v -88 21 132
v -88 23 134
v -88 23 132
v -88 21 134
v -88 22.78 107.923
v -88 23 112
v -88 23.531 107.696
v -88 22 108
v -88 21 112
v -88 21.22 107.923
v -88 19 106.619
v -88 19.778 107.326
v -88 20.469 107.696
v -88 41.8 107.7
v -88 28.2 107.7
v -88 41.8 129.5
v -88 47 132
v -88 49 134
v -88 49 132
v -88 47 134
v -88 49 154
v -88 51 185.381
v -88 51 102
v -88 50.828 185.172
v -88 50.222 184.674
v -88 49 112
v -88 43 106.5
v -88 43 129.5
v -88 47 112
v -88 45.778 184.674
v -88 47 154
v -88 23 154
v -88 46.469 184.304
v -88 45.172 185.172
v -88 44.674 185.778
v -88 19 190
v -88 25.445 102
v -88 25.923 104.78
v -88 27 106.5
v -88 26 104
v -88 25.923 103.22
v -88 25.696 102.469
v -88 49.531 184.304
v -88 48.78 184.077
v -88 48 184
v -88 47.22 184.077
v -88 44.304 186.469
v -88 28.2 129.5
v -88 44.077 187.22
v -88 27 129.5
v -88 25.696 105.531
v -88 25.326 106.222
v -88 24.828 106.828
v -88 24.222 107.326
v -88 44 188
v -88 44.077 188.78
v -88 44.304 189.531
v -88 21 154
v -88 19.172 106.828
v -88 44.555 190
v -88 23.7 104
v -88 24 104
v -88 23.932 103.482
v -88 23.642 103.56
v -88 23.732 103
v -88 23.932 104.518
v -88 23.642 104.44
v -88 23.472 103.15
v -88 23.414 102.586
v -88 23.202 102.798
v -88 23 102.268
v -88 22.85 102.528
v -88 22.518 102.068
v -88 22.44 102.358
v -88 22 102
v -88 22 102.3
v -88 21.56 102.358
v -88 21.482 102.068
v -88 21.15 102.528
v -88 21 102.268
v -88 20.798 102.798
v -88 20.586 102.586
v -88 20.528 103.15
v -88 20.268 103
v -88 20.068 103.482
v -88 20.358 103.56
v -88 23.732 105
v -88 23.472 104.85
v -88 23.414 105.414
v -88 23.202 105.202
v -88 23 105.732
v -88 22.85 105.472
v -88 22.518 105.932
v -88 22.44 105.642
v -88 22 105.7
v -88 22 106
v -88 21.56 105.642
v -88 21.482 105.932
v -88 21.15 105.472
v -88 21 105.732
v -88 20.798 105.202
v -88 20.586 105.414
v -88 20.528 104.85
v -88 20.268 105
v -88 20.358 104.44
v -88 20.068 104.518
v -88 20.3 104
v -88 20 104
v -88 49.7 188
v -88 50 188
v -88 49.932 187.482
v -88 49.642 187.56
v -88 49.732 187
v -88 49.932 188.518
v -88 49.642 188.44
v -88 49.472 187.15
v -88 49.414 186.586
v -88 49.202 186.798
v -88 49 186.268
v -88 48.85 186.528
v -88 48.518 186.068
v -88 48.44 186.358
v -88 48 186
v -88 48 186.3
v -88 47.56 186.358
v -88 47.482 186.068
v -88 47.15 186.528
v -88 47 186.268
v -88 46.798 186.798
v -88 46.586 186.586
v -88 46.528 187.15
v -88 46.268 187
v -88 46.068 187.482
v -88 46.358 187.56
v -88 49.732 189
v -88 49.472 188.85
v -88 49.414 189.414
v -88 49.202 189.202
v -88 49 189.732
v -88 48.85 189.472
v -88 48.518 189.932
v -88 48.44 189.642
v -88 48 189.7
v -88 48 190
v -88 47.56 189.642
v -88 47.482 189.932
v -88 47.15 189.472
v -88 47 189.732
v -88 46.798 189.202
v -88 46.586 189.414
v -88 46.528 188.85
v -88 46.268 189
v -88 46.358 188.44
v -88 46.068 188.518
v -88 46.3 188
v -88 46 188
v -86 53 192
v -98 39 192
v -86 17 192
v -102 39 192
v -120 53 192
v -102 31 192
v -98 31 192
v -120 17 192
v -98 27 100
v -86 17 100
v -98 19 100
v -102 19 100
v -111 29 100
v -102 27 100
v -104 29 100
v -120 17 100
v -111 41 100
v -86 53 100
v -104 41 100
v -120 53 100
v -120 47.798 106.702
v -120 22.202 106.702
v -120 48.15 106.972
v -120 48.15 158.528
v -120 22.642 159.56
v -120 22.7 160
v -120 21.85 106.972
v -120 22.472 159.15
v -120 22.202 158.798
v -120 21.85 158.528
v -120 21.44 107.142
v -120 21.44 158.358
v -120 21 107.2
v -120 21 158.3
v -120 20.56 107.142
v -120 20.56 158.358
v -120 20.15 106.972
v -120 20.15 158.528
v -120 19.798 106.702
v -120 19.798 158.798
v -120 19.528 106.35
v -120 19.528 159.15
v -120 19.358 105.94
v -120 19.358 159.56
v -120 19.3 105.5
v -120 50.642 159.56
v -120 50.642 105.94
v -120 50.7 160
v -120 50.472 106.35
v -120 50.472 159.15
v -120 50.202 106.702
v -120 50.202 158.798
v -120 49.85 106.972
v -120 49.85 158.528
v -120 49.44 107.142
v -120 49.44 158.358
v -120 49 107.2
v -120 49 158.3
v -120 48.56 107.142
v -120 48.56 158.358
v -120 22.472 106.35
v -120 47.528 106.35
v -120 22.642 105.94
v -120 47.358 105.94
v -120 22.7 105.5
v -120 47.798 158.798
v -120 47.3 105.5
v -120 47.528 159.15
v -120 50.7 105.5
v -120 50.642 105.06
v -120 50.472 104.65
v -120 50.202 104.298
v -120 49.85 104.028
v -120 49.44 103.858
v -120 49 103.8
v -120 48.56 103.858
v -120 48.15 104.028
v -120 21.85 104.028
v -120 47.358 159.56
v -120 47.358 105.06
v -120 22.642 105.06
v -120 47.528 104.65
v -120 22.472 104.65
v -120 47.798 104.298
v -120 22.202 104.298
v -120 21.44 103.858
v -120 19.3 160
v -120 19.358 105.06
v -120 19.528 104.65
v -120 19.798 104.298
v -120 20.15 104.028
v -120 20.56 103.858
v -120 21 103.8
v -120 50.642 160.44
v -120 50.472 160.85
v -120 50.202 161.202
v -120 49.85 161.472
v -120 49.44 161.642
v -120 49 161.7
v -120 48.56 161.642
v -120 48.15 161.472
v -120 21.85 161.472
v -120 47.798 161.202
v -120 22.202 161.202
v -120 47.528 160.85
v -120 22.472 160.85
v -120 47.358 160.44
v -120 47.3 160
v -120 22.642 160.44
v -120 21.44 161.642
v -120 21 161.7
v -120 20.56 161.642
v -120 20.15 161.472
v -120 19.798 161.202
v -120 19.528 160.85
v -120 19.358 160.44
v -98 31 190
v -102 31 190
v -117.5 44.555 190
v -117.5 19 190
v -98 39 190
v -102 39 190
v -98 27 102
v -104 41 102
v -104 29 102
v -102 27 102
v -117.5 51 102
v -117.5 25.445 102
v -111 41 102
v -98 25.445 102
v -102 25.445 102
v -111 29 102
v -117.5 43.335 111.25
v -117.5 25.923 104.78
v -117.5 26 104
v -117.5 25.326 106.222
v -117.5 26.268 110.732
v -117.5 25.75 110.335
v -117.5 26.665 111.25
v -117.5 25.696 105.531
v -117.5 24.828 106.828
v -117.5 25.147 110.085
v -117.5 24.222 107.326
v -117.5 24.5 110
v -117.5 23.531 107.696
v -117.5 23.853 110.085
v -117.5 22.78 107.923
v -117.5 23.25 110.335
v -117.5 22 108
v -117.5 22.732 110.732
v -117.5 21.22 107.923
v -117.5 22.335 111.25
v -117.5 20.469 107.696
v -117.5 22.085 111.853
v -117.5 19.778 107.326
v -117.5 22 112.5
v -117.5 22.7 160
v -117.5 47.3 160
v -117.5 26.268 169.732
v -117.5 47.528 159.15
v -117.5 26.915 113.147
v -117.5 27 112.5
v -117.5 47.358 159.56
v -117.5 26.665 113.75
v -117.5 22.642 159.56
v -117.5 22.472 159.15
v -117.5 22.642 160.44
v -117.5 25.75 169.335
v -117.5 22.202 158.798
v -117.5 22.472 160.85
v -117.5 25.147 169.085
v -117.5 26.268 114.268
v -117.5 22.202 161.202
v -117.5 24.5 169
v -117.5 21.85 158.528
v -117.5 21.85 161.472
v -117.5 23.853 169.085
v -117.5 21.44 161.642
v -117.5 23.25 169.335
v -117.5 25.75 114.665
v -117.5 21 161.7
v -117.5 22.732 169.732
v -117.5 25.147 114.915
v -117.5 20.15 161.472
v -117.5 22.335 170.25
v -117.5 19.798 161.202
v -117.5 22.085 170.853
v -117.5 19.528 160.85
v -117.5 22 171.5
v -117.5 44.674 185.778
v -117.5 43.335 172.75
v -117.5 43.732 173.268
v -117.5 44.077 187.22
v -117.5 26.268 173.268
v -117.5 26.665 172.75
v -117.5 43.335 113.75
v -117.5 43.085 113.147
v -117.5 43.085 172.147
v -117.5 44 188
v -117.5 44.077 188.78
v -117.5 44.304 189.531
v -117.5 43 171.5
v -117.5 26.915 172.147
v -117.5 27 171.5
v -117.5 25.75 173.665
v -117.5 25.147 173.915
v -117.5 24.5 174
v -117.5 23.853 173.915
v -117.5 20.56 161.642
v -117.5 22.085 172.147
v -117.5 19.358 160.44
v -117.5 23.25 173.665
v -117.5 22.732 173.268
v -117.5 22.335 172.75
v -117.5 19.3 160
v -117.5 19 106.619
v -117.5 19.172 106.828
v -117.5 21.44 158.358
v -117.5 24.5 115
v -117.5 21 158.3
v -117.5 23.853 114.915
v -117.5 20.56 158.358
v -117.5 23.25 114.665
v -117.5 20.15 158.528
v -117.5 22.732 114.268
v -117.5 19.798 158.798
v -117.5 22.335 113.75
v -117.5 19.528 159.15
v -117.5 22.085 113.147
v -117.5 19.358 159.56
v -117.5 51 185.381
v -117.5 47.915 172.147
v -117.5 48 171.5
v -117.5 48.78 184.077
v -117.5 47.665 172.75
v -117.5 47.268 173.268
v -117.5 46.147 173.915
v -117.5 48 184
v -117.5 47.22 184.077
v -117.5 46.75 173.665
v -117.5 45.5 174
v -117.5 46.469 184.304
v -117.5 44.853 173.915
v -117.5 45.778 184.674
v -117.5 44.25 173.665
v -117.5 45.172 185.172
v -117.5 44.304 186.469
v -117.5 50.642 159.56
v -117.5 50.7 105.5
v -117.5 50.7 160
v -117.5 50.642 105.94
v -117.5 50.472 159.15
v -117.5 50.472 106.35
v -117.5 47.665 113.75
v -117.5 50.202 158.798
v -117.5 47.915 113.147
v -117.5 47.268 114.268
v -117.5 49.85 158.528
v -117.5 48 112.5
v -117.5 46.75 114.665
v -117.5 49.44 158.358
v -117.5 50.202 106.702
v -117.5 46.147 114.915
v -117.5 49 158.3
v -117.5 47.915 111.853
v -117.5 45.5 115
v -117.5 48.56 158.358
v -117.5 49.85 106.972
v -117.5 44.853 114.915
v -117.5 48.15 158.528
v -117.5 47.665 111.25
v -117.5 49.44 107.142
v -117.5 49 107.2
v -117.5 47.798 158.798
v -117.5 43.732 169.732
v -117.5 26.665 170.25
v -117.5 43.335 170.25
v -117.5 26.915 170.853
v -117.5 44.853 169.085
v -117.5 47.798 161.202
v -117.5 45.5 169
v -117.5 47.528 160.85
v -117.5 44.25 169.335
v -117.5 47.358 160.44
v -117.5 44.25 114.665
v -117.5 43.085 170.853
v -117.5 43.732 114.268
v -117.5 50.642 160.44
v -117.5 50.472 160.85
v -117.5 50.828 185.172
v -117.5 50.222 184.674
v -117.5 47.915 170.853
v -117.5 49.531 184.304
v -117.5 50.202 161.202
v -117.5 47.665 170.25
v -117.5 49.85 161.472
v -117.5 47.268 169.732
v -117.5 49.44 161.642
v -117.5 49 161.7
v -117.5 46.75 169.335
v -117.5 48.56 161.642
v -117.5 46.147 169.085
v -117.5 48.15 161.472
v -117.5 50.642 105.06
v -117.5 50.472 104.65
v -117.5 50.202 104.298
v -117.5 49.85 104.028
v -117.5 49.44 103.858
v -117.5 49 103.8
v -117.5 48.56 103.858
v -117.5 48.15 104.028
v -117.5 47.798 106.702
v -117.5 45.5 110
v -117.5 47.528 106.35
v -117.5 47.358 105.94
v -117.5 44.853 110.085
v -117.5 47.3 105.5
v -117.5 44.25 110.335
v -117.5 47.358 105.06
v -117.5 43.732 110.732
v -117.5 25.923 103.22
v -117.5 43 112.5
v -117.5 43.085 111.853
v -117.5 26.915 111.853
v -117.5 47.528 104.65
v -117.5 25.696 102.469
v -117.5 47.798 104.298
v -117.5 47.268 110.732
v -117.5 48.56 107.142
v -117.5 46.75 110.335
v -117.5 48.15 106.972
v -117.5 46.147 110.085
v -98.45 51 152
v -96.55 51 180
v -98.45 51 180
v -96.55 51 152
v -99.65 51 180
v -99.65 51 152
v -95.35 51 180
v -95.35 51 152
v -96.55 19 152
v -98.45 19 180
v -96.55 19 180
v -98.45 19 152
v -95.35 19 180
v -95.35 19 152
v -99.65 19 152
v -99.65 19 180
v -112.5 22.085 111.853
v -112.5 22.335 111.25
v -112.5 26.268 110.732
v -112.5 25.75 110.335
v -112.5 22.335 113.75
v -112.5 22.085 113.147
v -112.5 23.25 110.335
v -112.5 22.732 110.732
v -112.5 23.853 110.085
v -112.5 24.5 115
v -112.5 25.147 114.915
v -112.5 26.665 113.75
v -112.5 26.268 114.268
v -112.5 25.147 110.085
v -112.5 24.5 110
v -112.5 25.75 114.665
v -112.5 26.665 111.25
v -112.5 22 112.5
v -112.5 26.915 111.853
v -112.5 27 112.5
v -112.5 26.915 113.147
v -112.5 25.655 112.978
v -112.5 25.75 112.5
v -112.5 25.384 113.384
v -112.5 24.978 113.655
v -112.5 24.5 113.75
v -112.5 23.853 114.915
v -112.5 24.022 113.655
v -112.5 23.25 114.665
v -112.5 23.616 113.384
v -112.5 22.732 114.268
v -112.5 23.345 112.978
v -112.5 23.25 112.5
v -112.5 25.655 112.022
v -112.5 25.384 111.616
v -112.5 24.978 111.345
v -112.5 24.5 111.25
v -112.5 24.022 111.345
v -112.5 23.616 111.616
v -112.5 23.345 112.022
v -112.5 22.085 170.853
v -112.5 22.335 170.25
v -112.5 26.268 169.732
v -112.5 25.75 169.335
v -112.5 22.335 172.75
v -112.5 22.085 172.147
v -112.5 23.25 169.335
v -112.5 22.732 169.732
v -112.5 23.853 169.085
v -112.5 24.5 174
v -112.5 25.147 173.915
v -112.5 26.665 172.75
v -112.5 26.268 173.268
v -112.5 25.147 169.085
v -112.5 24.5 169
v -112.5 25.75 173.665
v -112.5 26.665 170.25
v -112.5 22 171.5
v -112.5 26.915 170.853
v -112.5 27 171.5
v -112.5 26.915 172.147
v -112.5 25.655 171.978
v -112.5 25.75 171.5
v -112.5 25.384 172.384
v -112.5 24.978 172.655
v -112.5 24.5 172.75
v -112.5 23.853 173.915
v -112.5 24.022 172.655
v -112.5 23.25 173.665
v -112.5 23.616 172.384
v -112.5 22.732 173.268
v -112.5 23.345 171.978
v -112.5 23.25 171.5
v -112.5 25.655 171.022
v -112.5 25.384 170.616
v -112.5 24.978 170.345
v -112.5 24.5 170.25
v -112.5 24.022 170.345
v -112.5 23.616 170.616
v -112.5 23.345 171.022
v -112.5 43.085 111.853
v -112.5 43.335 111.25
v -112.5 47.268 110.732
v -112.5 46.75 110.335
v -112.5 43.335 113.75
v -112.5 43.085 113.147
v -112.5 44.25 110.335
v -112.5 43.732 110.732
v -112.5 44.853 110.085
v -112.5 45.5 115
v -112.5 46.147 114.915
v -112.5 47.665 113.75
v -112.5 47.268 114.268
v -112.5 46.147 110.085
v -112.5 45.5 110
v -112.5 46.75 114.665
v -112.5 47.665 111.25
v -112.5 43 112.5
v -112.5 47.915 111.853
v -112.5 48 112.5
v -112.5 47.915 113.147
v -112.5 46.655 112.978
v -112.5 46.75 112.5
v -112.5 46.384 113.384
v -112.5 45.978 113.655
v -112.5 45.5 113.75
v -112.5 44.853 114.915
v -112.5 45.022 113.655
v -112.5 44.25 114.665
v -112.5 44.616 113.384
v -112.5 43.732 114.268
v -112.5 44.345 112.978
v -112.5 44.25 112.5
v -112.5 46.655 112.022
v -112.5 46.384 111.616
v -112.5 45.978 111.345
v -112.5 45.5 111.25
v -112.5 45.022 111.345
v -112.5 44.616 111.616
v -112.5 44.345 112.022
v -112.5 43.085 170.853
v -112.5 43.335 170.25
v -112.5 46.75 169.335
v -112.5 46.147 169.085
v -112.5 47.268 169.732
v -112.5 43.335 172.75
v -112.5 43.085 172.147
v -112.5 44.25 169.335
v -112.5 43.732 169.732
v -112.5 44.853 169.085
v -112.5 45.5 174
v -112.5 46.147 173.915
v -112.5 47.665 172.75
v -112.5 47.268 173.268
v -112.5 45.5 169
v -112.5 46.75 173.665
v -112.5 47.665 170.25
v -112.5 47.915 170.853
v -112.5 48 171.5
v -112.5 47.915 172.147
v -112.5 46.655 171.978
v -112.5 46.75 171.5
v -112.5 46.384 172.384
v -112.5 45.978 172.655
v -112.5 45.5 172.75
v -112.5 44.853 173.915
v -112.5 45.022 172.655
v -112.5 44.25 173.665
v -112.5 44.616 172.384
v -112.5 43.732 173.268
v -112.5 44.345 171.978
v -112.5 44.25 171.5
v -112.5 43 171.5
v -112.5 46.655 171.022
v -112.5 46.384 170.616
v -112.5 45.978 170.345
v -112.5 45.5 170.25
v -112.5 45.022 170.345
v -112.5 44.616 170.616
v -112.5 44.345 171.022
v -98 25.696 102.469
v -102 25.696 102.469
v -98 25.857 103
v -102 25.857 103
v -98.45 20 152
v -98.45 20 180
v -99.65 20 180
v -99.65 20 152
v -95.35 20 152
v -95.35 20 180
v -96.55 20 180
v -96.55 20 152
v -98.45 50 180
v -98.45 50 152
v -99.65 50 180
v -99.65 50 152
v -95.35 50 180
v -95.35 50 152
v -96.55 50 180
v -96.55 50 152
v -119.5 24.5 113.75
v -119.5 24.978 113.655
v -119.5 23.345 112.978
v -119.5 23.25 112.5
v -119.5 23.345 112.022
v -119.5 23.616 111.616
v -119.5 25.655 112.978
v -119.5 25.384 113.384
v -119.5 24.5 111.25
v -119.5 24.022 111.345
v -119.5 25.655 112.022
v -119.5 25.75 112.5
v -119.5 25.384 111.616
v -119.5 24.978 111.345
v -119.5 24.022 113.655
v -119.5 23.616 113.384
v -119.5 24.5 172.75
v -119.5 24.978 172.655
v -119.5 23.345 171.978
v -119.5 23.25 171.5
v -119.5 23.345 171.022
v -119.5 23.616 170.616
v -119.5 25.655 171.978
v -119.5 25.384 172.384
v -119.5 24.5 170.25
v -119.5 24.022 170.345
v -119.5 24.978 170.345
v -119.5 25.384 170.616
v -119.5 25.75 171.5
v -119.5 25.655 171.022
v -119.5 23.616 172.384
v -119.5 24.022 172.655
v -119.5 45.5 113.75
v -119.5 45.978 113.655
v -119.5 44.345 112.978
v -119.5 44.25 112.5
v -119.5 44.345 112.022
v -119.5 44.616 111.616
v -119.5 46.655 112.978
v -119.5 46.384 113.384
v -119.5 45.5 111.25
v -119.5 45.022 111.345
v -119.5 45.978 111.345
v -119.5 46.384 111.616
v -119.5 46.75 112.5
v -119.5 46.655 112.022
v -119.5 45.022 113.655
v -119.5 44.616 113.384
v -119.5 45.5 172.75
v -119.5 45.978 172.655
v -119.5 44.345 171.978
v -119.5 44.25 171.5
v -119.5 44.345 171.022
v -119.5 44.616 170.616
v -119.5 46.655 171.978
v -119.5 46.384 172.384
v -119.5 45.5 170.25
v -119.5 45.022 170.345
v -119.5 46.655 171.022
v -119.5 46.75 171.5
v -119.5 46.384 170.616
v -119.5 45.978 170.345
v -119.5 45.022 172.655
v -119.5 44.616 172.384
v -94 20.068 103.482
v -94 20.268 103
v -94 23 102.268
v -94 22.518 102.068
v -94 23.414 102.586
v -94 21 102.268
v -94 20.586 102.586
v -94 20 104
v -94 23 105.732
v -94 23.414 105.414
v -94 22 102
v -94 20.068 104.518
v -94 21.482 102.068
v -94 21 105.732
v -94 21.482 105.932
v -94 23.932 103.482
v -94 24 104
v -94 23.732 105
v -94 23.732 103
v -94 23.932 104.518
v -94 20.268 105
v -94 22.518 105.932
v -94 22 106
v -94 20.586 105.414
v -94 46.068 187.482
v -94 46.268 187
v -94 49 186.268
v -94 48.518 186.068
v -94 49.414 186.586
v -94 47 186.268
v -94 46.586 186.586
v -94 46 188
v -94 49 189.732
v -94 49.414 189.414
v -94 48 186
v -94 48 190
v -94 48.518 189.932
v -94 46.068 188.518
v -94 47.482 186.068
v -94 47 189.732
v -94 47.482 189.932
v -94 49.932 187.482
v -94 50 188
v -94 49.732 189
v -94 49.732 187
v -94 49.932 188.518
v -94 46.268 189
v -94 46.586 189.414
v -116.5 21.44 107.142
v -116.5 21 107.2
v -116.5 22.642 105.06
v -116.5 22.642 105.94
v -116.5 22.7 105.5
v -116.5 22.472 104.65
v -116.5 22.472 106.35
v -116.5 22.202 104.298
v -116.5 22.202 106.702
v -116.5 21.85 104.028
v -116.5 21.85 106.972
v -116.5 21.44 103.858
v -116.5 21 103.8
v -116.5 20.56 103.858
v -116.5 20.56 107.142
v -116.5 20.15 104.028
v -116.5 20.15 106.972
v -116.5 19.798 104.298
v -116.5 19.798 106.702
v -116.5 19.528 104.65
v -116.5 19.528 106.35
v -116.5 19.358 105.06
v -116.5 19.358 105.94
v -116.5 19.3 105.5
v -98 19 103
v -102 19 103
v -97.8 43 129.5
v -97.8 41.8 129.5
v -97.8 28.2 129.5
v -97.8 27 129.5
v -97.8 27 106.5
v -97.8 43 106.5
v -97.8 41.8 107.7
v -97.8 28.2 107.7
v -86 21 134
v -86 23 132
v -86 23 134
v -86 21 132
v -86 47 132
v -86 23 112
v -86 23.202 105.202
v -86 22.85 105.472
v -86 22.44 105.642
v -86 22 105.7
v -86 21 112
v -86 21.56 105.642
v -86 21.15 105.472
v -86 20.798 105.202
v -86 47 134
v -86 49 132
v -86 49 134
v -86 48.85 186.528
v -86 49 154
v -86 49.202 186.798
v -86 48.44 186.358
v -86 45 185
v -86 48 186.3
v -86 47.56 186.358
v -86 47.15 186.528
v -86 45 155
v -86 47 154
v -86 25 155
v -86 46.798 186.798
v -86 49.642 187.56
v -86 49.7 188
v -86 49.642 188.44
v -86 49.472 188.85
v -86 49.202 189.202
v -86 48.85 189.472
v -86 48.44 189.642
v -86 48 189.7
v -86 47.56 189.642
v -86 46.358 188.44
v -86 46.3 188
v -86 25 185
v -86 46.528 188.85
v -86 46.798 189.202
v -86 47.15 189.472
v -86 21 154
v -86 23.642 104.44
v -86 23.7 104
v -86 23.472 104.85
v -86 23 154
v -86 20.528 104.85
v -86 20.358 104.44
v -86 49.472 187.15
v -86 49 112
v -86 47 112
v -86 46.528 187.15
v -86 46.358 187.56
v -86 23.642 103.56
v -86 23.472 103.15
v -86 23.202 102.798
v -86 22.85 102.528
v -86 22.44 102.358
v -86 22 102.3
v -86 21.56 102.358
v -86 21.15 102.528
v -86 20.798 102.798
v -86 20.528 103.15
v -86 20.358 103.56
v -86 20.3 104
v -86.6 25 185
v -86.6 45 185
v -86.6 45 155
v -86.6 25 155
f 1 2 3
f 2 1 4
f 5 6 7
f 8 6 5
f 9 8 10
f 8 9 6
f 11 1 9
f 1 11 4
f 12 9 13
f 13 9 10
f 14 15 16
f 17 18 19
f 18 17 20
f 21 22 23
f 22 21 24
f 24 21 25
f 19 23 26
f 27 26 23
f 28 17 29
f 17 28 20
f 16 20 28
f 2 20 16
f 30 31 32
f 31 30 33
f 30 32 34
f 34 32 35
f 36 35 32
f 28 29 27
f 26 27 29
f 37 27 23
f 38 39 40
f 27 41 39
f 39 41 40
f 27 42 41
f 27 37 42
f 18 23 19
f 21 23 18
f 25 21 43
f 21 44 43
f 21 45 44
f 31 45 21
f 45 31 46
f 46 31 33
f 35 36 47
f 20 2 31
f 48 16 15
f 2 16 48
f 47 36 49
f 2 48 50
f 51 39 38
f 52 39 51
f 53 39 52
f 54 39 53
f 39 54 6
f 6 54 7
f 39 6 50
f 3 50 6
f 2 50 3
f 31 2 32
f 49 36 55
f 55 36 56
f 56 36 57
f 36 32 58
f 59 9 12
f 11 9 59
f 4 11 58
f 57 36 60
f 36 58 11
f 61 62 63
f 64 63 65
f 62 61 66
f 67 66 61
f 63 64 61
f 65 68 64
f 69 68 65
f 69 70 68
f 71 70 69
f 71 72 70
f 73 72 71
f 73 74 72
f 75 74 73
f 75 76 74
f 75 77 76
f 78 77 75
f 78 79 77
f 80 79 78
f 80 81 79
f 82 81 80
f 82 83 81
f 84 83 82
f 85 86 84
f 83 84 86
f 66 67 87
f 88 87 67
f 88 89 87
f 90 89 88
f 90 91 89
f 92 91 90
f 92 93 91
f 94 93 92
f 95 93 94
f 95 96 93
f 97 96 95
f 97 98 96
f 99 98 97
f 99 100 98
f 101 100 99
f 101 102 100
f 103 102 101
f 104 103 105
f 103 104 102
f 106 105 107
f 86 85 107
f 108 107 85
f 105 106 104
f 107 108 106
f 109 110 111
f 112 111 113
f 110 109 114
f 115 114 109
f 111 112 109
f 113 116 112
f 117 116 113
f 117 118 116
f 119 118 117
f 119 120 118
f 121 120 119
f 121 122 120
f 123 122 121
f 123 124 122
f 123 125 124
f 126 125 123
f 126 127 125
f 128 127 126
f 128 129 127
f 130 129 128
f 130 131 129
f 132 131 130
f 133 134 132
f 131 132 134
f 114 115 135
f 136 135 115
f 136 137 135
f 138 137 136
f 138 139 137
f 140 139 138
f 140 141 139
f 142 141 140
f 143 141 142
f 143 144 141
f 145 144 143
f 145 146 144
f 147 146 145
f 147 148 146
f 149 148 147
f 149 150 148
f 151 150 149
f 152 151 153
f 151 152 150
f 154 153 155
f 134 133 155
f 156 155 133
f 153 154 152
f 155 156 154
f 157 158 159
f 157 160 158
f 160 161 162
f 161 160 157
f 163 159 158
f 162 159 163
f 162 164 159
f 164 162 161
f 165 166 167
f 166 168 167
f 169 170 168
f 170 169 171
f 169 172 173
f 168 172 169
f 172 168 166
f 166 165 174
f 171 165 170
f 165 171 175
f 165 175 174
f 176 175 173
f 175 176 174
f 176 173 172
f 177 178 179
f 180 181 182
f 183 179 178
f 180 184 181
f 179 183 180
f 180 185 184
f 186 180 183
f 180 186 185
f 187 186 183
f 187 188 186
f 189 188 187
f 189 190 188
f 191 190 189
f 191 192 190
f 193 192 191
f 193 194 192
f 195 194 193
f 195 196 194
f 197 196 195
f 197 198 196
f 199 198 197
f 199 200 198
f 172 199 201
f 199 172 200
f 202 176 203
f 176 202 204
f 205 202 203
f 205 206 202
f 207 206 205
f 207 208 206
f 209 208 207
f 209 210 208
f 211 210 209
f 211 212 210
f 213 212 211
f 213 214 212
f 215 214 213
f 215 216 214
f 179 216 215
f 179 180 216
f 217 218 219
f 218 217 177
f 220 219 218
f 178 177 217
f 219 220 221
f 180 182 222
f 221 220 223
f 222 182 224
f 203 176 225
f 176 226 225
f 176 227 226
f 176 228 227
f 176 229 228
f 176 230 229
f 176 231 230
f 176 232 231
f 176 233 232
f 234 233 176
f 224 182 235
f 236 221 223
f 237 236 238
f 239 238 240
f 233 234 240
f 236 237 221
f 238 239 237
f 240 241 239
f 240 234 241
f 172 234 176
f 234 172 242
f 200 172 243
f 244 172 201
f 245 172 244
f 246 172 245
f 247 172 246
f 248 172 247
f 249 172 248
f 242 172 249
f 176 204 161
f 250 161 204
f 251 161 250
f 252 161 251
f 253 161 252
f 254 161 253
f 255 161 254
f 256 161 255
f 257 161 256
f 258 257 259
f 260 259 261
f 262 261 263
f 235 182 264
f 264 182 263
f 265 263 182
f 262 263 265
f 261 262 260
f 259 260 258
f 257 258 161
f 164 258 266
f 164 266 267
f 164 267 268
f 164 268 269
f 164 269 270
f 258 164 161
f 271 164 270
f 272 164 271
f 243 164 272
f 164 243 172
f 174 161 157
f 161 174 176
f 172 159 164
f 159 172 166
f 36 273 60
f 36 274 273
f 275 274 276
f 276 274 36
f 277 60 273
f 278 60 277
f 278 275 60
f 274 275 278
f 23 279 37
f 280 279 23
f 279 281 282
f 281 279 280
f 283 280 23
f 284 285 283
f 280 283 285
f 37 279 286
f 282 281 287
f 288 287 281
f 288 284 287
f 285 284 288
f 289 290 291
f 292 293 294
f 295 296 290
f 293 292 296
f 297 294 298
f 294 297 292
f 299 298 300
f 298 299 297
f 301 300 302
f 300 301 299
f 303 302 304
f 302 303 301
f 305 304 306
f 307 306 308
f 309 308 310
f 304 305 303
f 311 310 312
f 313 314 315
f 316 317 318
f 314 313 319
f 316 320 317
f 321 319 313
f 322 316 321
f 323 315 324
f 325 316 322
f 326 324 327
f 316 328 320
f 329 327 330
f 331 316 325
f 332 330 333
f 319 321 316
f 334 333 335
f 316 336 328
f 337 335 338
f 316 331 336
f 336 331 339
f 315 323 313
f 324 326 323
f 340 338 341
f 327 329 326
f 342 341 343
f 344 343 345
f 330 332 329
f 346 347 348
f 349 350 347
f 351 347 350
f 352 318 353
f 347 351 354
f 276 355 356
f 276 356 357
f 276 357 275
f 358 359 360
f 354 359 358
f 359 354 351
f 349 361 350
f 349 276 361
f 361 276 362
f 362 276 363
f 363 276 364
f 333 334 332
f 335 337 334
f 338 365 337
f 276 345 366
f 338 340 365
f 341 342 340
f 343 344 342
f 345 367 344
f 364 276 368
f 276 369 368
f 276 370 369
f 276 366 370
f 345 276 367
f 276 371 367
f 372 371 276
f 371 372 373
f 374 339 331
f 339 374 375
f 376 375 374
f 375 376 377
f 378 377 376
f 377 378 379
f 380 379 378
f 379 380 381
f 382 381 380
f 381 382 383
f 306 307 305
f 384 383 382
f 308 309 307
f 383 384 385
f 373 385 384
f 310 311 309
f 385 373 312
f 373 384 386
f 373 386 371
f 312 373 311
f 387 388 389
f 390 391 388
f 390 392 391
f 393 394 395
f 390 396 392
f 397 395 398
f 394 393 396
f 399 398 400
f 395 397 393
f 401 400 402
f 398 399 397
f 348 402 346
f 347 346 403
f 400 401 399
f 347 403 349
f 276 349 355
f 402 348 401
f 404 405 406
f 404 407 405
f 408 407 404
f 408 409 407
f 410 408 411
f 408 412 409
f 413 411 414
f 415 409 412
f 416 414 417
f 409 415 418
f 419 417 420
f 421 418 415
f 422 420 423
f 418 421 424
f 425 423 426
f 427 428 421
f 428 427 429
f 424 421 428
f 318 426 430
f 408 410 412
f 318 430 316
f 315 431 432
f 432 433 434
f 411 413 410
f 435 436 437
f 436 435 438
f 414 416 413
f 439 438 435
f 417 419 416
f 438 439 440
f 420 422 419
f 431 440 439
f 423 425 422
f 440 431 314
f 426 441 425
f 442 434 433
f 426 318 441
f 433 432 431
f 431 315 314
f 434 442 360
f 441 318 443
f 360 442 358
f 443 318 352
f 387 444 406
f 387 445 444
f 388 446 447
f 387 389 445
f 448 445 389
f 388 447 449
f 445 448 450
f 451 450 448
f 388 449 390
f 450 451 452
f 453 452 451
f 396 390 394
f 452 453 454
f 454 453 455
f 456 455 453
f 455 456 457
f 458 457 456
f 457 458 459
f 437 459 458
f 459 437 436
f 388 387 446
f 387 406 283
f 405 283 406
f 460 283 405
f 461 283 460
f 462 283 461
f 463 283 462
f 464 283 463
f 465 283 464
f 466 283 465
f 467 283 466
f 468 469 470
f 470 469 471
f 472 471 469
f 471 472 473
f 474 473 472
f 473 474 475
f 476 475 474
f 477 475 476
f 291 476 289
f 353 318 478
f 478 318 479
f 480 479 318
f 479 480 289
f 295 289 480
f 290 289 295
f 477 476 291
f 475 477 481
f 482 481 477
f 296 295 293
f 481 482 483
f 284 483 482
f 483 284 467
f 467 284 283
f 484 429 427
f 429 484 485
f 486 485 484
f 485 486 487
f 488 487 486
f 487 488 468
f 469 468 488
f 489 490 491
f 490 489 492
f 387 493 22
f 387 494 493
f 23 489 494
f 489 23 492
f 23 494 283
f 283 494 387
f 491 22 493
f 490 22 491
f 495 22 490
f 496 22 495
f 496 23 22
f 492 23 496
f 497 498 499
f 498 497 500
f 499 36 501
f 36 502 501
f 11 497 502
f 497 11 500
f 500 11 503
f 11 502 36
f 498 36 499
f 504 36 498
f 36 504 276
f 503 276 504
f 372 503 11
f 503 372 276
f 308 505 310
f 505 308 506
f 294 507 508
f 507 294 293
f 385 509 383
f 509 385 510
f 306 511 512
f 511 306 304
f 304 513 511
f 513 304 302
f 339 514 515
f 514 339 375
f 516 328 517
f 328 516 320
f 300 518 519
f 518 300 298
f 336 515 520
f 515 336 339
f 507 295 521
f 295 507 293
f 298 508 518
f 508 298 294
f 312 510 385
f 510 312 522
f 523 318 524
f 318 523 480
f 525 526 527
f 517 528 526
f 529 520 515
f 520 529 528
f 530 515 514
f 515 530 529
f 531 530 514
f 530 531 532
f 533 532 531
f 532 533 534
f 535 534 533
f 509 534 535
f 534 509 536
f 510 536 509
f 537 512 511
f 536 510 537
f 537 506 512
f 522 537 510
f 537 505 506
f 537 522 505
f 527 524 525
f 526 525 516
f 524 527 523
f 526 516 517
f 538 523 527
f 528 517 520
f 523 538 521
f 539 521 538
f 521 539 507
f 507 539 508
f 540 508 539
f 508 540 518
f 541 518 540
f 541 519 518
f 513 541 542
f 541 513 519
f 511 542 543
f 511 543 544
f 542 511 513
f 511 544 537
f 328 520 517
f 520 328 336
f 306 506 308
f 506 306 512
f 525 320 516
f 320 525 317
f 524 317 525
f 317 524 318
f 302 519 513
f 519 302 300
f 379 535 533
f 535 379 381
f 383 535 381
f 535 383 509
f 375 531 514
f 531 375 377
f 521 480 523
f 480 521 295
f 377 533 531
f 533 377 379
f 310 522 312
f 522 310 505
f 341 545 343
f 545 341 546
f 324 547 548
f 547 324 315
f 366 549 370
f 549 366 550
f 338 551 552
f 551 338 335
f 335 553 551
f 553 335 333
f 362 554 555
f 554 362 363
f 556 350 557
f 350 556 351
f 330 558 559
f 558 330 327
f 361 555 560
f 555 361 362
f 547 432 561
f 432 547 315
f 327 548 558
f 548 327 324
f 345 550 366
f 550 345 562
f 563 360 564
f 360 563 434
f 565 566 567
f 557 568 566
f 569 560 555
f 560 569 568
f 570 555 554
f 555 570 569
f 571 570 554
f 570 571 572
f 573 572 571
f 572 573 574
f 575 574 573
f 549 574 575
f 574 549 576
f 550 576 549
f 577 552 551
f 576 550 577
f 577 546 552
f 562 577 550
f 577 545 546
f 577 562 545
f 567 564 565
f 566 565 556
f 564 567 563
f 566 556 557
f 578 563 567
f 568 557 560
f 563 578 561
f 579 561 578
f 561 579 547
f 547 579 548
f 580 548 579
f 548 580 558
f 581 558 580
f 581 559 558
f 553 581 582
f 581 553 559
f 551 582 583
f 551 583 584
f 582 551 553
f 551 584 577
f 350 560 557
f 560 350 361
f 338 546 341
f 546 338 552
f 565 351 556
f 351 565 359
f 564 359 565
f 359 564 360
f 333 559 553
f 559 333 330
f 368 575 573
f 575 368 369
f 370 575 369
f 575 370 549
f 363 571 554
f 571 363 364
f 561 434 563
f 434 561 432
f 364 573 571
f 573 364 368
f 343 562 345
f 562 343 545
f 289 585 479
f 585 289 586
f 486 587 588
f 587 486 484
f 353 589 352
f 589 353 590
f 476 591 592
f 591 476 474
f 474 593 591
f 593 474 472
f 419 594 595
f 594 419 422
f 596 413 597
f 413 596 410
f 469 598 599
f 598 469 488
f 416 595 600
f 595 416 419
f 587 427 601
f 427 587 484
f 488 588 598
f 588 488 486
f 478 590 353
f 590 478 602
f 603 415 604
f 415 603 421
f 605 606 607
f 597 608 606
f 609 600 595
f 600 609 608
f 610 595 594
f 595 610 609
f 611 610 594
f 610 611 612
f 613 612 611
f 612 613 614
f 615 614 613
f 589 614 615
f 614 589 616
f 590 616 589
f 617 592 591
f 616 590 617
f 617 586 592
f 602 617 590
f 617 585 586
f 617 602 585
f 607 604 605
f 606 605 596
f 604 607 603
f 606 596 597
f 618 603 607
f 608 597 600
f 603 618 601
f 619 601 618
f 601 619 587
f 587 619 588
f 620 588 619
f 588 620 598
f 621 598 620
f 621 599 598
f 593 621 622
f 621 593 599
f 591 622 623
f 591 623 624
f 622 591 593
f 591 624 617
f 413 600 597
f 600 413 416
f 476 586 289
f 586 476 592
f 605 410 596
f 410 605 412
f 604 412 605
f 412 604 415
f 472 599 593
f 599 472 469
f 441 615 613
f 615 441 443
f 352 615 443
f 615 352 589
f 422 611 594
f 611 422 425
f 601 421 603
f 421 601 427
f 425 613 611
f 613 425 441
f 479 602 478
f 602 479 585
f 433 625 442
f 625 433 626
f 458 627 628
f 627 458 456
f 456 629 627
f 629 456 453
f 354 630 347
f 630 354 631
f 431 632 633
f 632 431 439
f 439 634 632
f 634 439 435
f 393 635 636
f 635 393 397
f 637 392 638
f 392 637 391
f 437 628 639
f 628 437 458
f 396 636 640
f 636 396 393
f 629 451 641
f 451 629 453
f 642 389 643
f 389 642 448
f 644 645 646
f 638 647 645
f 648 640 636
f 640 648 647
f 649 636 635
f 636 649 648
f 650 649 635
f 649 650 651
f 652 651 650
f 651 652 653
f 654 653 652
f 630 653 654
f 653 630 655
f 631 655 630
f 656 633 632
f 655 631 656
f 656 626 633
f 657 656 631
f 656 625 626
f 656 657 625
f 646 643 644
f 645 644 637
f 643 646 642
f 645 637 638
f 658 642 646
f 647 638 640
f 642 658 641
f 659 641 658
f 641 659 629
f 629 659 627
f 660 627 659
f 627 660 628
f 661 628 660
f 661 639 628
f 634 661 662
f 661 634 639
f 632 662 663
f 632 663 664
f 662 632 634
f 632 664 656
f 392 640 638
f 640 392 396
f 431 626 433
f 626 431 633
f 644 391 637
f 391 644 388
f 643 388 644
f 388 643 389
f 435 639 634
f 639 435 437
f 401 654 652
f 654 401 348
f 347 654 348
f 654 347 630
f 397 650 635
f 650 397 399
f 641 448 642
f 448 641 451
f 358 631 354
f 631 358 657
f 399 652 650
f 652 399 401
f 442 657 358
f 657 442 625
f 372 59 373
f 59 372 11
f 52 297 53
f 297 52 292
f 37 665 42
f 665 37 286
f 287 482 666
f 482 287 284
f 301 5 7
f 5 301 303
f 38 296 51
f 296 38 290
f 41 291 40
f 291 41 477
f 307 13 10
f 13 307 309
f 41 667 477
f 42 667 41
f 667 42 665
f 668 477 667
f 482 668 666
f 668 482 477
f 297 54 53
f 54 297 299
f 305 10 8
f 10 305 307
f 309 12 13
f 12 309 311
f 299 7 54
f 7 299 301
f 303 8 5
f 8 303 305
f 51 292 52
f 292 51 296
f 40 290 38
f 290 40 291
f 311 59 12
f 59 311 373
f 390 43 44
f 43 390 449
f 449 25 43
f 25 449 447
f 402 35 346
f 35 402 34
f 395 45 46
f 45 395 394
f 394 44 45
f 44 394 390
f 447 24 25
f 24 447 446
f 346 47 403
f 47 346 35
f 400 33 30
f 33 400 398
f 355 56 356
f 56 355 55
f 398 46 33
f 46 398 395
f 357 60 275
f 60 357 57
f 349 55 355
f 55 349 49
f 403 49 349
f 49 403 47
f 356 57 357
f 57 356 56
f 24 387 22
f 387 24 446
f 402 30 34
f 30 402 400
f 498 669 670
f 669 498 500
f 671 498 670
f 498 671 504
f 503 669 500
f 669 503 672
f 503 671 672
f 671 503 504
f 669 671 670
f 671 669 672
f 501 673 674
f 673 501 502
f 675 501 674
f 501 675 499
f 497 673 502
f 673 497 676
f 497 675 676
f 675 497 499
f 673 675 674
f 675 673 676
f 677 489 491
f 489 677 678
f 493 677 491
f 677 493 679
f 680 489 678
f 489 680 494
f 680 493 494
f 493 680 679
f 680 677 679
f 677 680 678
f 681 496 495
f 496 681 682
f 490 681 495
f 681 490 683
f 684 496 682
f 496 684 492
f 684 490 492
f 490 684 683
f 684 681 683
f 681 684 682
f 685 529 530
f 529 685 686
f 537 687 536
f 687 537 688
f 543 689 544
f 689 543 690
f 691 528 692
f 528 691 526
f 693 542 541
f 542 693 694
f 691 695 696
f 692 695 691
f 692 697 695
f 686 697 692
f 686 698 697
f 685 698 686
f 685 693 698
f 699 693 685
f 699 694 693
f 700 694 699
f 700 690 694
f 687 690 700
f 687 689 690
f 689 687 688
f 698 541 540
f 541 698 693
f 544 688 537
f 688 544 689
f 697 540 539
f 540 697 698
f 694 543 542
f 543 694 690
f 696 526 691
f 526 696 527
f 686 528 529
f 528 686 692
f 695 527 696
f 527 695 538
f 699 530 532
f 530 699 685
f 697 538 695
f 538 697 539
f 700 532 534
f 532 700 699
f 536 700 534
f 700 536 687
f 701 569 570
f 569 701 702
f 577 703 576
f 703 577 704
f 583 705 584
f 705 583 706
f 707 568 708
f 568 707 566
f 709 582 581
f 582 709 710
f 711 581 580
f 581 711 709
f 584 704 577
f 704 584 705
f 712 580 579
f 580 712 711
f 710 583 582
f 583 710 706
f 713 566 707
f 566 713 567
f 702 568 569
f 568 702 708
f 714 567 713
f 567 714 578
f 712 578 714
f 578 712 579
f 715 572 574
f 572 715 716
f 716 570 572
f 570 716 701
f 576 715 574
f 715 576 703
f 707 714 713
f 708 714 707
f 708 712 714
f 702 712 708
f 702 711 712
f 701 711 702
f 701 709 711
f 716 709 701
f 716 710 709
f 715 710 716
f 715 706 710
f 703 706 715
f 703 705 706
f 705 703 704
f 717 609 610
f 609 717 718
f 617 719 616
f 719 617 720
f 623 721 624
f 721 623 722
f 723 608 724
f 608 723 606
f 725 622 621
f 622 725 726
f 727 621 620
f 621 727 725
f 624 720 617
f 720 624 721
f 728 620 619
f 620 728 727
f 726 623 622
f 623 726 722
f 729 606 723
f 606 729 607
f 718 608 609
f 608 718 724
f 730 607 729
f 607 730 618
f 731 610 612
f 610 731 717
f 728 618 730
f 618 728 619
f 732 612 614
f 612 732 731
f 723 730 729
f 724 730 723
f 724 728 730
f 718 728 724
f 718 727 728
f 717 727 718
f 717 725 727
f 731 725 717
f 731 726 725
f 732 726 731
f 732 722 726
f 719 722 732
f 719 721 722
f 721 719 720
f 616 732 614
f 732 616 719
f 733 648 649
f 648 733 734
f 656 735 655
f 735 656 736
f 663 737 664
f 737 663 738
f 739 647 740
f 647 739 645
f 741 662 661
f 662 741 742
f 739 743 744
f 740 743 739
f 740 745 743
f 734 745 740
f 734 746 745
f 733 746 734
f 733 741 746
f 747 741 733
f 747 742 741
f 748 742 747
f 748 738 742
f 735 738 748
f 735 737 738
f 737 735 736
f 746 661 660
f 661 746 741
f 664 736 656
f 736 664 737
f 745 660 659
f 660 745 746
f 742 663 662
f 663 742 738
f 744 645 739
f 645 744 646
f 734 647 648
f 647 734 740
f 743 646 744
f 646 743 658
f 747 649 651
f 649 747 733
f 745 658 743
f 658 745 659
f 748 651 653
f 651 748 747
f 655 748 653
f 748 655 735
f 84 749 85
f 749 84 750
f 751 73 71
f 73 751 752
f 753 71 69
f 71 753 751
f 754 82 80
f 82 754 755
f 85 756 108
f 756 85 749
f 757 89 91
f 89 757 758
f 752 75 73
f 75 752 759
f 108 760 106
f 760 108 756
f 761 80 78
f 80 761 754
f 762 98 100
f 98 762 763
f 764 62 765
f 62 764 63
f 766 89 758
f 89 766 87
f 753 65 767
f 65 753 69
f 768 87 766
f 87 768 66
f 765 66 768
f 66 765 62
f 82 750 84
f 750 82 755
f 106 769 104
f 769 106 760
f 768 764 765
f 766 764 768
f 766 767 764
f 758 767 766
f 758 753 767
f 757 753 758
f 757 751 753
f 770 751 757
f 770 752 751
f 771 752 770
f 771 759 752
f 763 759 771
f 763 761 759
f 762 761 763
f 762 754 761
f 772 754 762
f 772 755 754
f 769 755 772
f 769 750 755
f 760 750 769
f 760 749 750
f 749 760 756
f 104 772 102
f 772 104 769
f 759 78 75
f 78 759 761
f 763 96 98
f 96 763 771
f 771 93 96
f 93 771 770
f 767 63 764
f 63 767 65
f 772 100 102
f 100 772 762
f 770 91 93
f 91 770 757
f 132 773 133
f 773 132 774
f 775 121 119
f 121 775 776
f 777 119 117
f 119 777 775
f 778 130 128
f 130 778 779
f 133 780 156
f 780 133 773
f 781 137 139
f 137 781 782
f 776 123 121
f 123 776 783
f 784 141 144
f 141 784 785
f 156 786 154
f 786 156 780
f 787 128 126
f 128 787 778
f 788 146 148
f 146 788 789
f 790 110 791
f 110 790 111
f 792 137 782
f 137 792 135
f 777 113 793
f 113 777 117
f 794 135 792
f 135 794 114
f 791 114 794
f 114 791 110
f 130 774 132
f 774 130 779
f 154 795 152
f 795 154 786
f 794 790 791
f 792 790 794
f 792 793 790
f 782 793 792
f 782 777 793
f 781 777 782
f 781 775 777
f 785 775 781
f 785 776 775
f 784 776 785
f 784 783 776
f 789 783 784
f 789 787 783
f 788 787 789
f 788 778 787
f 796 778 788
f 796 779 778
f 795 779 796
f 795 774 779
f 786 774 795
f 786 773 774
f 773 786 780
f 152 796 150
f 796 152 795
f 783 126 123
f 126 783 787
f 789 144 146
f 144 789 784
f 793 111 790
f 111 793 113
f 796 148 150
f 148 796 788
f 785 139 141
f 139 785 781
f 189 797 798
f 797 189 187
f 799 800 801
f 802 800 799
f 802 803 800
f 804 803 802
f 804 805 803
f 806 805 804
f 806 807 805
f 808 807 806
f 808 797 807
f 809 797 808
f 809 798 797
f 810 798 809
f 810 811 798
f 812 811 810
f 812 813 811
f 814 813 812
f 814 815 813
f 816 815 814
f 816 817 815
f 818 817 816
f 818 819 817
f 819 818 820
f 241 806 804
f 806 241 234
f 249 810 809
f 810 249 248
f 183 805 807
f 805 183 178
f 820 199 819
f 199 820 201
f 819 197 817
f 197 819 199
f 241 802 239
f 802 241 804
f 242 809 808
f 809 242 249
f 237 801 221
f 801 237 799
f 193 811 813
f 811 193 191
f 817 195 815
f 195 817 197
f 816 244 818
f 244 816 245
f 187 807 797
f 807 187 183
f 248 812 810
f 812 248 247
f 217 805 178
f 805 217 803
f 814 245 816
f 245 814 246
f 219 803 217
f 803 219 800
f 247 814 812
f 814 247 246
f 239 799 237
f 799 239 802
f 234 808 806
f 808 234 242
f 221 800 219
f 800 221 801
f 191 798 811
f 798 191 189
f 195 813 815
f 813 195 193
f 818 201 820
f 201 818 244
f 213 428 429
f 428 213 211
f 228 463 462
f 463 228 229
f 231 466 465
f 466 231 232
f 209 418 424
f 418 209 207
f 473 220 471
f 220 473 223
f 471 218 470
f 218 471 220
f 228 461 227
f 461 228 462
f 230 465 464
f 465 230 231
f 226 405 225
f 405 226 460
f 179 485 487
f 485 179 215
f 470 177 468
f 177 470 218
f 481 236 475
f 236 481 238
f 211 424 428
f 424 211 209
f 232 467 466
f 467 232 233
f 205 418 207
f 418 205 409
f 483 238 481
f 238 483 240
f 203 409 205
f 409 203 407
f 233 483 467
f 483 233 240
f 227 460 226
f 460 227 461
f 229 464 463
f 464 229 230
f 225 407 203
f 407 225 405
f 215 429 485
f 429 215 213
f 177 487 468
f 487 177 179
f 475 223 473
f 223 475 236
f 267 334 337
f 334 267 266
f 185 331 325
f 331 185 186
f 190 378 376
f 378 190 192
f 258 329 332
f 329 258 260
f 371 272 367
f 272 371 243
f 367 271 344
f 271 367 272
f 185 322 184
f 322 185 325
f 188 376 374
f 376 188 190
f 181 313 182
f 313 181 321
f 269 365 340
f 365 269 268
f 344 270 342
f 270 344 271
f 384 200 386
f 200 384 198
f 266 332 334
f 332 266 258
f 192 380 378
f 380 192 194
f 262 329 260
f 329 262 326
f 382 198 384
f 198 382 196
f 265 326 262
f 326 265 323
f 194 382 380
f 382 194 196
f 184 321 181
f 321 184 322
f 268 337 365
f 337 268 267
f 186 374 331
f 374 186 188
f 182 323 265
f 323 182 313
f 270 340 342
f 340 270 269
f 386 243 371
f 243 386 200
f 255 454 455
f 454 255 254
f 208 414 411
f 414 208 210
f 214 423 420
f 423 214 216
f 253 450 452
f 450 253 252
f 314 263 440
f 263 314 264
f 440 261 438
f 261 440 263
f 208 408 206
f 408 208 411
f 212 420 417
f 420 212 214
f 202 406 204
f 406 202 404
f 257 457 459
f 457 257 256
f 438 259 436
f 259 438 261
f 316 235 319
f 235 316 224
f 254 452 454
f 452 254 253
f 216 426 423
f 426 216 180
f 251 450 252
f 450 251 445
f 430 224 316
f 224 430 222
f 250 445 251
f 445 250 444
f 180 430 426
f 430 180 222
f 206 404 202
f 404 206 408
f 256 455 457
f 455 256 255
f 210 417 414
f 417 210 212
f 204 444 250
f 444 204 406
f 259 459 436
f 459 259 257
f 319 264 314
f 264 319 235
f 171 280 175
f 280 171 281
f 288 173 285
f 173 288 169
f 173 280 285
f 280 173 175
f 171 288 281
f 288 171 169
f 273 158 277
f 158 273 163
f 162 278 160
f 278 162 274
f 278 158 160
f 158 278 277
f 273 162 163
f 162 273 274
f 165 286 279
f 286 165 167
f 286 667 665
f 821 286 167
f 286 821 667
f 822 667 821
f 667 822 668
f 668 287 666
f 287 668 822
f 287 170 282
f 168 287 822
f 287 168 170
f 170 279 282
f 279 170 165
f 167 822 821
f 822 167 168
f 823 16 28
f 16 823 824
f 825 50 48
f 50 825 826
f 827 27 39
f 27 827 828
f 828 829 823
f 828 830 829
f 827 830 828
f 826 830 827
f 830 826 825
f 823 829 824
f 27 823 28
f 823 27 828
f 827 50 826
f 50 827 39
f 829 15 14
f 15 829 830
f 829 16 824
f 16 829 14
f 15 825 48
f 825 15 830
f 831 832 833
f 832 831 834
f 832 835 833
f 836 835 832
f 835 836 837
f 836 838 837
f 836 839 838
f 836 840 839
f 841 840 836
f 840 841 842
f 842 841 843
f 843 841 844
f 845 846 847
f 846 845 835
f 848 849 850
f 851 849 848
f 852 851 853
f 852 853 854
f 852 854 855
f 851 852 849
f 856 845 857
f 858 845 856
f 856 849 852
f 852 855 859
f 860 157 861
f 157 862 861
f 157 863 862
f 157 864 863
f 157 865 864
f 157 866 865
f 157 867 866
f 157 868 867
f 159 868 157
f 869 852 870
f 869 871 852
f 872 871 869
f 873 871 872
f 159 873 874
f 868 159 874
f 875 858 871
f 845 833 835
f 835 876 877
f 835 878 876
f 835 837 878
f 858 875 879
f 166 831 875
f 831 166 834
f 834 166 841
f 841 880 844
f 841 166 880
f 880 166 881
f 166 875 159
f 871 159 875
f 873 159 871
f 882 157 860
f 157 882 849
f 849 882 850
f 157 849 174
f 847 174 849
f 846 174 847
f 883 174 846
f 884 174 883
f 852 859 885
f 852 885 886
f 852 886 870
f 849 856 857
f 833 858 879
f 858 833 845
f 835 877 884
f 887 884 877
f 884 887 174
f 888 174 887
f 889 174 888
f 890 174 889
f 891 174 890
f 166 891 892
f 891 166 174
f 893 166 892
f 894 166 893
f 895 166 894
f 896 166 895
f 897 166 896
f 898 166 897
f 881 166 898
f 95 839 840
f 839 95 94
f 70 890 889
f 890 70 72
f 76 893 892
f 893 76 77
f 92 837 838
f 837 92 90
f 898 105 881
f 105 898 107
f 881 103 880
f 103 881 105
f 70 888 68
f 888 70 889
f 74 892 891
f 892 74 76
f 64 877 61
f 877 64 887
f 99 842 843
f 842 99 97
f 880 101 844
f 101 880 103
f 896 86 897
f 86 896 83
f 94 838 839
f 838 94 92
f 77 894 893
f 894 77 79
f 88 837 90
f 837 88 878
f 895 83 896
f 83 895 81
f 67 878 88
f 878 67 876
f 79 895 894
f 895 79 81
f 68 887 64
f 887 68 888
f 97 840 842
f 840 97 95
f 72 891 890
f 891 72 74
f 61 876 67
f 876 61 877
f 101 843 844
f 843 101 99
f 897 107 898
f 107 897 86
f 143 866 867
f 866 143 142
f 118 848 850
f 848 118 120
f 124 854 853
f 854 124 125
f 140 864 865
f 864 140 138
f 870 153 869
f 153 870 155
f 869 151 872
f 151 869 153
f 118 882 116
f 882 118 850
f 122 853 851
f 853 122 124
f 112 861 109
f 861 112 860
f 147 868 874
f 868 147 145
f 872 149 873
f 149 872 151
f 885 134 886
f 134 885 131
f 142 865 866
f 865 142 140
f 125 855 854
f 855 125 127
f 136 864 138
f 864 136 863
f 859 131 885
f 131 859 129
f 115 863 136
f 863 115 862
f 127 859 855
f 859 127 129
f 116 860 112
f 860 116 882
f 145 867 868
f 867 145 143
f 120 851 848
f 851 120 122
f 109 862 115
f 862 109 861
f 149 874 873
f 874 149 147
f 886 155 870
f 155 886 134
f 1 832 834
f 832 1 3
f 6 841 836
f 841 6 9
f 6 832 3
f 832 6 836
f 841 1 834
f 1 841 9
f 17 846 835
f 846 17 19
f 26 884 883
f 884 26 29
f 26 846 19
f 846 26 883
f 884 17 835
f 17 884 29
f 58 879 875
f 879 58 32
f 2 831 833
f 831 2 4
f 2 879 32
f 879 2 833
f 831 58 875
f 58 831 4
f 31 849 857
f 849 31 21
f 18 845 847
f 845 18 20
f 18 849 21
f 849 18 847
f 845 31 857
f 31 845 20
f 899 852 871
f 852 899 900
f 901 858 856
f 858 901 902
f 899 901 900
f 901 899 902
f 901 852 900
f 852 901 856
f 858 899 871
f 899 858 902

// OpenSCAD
// =====================================================================
//  p03_p04_electronics_tray.scad - P3 electronics tray and P4 tray lid (on the VESA adapter's front face)
//  PROJECT SCRATCH · 05-engineering/cad/frame · units: mm · frame: global (section 2)
//  Sources: mechanical.md section 3.3 (tray seat Y +15..50, Z 120..165, 4 x M3), 11 P3 (32 x 36 x 92; OpenRB-150
//  pocket ~66 x 25 [VERIFY] on 4 diam 2.5 bosses, Wago 221-413 and 30 x 20 perfboard, USB-C 12 x 7, cable slots 8 x 4),
//  11 P4 (2 x 36 x 92, vent slots 2 x 20, 2 x diam 3.4, label recess).  PART = "tray" | "lid" | "both".
//  Tray X -120..-88 (open toward +X), Y 17..53, Z 100..192; the lid carries a Wago cradle inside (C-E1).
//  CONFLICT C-E2: the frame yaw plates sweep through this tray during the 25 deg fail-safe lift.
// =====================================================================
include <lib_sp1.scad>
PART = "both";
X0 = -120;  X1 = -88;  Y0 = 17;  Y1 = 53;  Z0 = 100;  Z1 = 192;  WALL = 2;  BACK = 2.5;  YC = (Y0 + Y1) / 2;
BRD_Z0 = 109;  BRD_HOLES = [[-4.5, 3.5], [-4.5, 62.5], [16.5, 3.5], [16.5, 62.5]];   // OpenRB-150 [VERIFY], (dY, dZ) from (YC - 6, BRD_Z0)
BOSS_D = 5;  BOSS_H = 5;  BOSS_HOLE = 2.5;
USB = [12, 7];  USB_X = -107.5;  SLOT = [8, 4];  LID_BOSS_D = 8;  LID_INS = [[22, 104], [48, 188]];
CARD_SLOT_X = -97.5;  CARD_SLOT_W = 1.9;  CARD_Z0 = 152;  CARD_Z1 = 180;
MOUNT_HOLES = [[21, 105.5], [49, 105.5], [21, 160], [49, 160]];                        // = P1 TRAY_HOLES

module p03_electronics_tray() difference() {
    union() {
        difference() { box(X0, X1, Y0, Y1, Z0, Z1); box(X0 + BACK, X1 + 1, Y0 + WALL, Y1 - WALL, Z0 + WALL, Z1 - WALL); }
        for (h = BRD_HOLES) cyl_x(BOSS_D / 2, X0 + BACK - 0.01, X0 + BACK + BOSS_H, YC + h[0] - 6, BRD_Z0 + h[1], fn = 24);   // board standoffs
        for (h = LID_INS) cyl_x(LID_BOSS_D / 2, X0 + BACK - 0.01, X1, h[0], h[1], fn = 32);                               // lid-screw bosses
        for (yw = [Y0 + WALL, Y1 - WALL]) for (dx = [-CARD_SLOT_W / 2 - 1.2, CARD_SLOT_W / 2])                          // perfboard card guides
            box(CARD_SLOT_X + dx, CARD_SLOT_X + dx + 1.2, min(yw - 0.01, yw + (yw < YC ? 1 : -1)), max(yw + 0.01, yw + (yw < YC ? 1 : -1)), CARD_Z0, CARD_Z1);
    }
    for (h = BRD_HOLES) cyl_x(BOSS_HOLE / 2, X0 + 0.5, X0 + BACK + BOSS_H + 1, YC + h[0] - 6, BRD_Z0 + h[1], fn = 16);
    for (h = LID_INS) ins_x(M3_INS_D, 6, h[0], h[1], X1, -1);
    for (h = MOUNT_HOLES) cyl_x(M3_CLEAR / 2, X0 - 1, X0 + BACK + 1, h[0], h[1], fn = 24);
    box(USB_X - USB[1] / 2, USB_X + USB[1] / 2, YC - USB[0] / 2, YC + USB[0] / 2, Z0 - 1, Z0 + WALL + 1);      // USB-C opening (bottom)
    box(X1 - 10 - SLOT[1], X1 - 10, YC - SLOT[0] / 2, YC + SLOT[0] / 2, Z1 - WALL - 1, Z1 + 1);                // cable slot top
    box(X1 - 10 - SLOT[1], X1 - 10, Y0 + 6 - SLOT[0] / 2, Y0 + 6 + SLOT[0] / 2, Z0 - 1, Z0 + WALL + 1);        // cable slot bottom
}

T = 2;  VENT_W = 2;  VENT_L = 20;  VENT_Z0 = [112, 134];  VENT_DY = [-13, 13];
LABEL = [20, 30, 0.6];  LABEL_ZC = 170;  WAGO_POCKET = [13.6, 20.6, 8.6];  WAGO_ZC = 118;   // Wago 221-413 [VERIFY 13.1 x 20.3 x 8.1]
module p04_tray_lid() difference() {
    union() {
        box(X1, X1 + T, Y0, Y1, Z0, Z1);
        difference() {                                                                                     // Wago cradle inside
            box(X1 - WAGO_POCKET[2] - 1.2, X1 + 0.01, YC - WAGO_POCKET[0] / 2 - 1.2, YC + WAGO_POCKET[0] / 2 + 1.2, WAGO_ZC - WAGO_POCKET[1] / 2 - 1.2, WAGO_ZC + WAGO_POCKET[1] / 2 + 1.2);
            box(X1 - WAGO_POCKET[2] - 2, X1 + 0.02, YC - WAGO_POCKET[0] / 2, YC + WAGO_POCKET[0] / 2, WAGO_ZC - WAGO_POCKET[1] / 2, WAGO_ZC + WAGO_POCKET[1] / 2 + 5);
        }
    }
    for (h = LID_INS) cyl_x(M3_CLEAR / 2, X1 - 1, X1 + T + 1, h[0], h[1], fn = 24);
    for (zz = VENT_Z0) for (dy = VENT_DY) box(X1 - 1, X1 + T + 1, YC + dy - VENT_W / 2, YC + dy + VENT_W / 2, zz, zz + VENT_L);   // 4 vent slots 2 x 20
    box(X1 + T - LABEL[2], X1 + T + 1, YC - LABEL[0] / 2, YC + LABEL[0] / 2, LABEL_ZC - LABEL[1] / 2, LABEL_ZC + LABEL[1] / 2);   // label recess
}
if (PART == "tray" || PART == "both") p03_electronics_tray();
if (PART == "lid" || PART == "both") p04_tray_lid();
